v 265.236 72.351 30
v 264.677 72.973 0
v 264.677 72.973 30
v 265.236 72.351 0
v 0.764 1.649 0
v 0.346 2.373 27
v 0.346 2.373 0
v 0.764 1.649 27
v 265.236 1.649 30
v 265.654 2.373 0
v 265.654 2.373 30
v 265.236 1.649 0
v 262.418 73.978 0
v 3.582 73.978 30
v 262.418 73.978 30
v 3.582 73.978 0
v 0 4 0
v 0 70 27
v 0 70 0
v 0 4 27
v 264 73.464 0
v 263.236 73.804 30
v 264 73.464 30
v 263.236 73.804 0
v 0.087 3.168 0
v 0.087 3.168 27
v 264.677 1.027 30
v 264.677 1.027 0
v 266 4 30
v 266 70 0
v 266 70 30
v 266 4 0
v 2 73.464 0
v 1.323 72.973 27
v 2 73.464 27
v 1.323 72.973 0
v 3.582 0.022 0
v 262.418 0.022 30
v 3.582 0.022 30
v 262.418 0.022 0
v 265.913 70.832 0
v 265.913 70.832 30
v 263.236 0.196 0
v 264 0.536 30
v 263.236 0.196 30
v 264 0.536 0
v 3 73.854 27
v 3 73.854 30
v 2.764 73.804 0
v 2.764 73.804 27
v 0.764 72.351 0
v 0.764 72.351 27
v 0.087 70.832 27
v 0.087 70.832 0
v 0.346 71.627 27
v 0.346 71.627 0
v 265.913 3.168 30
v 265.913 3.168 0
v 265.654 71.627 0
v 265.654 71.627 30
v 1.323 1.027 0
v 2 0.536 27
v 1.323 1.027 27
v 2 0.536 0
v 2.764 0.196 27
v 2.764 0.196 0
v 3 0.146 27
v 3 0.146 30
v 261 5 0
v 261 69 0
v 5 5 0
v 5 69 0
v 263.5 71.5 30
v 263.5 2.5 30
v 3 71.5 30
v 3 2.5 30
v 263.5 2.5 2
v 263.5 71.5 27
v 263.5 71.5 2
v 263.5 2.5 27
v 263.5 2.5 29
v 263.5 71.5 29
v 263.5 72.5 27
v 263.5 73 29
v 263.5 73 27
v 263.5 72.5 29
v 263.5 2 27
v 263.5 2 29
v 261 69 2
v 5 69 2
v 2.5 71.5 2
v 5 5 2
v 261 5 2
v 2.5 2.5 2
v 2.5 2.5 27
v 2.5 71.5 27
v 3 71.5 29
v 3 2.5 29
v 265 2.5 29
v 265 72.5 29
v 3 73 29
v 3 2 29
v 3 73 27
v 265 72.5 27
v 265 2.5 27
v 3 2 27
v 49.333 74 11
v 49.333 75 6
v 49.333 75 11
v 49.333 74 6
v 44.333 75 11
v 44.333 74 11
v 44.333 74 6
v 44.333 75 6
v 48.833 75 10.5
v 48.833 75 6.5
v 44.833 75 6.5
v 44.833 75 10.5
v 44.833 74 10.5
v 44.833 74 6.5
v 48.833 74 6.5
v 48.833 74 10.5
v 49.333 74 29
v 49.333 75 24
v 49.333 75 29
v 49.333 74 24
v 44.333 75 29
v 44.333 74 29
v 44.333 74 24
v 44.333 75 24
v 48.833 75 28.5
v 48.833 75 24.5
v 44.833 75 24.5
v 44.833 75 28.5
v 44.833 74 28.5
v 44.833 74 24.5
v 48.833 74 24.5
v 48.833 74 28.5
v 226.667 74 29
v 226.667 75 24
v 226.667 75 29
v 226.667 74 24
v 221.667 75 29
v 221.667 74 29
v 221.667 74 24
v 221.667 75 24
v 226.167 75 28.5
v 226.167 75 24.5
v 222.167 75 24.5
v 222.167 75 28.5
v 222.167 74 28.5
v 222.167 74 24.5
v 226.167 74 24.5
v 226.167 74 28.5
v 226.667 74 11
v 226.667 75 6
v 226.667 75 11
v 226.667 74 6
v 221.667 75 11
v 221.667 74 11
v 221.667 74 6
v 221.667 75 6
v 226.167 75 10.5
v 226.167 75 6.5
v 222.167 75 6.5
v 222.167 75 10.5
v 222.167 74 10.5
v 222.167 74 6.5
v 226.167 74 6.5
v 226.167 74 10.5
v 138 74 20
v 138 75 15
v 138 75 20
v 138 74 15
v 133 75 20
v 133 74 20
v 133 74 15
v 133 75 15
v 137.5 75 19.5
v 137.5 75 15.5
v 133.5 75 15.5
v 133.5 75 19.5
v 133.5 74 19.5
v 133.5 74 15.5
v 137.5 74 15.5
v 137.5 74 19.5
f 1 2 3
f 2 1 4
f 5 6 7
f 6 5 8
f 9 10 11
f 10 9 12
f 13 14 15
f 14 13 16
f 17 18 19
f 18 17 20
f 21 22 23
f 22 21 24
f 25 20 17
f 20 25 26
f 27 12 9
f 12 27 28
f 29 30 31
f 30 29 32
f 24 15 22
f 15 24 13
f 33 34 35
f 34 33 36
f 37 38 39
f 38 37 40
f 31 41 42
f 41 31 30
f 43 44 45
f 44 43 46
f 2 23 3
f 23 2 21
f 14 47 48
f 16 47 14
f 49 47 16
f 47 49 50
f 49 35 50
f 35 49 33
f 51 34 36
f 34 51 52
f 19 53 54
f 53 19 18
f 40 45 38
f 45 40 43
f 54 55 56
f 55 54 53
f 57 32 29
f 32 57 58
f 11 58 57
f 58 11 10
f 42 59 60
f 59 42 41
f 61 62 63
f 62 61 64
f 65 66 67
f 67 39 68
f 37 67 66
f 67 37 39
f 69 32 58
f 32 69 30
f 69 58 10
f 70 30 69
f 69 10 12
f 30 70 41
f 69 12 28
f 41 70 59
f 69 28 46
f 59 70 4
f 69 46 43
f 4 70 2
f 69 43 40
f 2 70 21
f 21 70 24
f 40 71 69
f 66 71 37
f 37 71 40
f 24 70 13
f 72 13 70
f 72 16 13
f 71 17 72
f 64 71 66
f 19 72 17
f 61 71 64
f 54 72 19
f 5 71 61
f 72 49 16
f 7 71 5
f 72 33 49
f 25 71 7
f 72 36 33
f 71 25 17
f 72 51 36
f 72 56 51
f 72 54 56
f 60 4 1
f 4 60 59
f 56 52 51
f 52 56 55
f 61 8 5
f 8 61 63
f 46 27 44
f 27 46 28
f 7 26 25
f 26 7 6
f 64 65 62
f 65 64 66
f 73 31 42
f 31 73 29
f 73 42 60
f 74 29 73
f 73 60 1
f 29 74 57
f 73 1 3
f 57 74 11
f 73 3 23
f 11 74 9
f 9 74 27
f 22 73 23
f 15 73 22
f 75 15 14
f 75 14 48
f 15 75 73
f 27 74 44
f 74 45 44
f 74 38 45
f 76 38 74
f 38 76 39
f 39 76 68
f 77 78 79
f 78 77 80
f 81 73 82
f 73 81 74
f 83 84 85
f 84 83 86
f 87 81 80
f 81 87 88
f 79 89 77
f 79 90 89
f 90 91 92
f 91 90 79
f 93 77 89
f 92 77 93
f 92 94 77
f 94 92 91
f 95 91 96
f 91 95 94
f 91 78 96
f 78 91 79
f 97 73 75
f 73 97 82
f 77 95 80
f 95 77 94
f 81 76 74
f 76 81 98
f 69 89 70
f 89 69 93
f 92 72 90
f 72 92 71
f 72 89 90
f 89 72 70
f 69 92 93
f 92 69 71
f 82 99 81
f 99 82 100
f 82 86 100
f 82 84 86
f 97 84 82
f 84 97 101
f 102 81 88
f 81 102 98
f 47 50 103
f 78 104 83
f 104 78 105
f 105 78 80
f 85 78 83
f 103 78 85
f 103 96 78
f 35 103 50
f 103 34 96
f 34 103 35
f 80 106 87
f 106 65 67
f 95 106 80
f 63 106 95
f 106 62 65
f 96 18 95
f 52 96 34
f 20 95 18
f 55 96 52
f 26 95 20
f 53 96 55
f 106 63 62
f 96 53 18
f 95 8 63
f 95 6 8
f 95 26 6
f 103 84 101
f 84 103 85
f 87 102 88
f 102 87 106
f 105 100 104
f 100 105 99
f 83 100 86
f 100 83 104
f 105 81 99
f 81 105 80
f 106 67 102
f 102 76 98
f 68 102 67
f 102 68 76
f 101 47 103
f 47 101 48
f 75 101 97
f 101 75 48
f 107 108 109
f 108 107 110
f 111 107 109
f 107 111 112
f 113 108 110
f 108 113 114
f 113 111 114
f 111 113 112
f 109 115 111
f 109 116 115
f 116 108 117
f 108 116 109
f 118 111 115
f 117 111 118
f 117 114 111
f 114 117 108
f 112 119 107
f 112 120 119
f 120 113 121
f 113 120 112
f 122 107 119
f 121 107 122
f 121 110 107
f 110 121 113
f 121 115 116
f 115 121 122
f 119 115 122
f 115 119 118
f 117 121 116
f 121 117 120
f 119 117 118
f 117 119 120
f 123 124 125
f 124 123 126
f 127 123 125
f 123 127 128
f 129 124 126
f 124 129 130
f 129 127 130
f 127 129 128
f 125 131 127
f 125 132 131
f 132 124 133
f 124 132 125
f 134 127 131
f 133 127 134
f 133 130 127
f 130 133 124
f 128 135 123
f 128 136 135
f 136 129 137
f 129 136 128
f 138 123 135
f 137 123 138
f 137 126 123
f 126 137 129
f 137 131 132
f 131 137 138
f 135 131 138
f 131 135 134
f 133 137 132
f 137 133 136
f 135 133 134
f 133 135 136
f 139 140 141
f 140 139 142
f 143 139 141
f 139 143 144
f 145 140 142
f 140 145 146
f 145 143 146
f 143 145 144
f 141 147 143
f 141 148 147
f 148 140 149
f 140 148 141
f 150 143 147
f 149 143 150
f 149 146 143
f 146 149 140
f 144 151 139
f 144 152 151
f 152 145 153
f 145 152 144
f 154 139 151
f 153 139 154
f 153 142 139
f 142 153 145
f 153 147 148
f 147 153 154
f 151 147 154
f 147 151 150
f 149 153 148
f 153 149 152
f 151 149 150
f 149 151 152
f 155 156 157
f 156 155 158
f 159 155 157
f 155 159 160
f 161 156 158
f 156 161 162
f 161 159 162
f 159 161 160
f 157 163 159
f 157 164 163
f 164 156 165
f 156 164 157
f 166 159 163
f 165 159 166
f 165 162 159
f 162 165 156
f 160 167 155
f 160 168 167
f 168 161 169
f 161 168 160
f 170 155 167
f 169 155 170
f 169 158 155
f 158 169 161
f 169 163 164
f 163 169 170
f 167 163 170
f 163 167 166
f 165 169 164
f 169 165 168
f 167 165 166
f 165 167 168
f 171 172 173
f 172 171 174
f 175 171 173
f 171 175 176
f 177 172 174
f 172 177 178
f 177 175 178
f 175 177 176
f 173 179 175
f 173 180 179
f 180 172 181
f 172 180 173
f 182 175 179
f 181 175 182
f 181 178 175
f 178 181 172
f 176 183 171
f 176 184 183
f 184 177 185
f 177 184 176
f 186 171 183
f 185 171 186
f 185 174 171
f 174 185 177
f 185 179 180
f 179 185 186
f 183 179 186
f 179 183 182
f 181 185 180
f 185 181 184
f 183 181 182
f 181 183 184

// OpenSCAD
$m_length = 256;
$m_width = 64;
$m_height = 15;

$margin_x = 5;
$margin_y = 5;

$margin = ([$margin_x,$margin_y,0]);

$wall_strength = 5;
$wall = ([$wall_strength,$wall_strength,0]);

$box_l = $m_length+$margin_x+$wall_strength;
$box_w = $m_width+$margin_y+$wall_strength;
$box_h = 30;

$matrix = ([$m_length,$m_width,$box_h]);

$stand = ([5,1,5]);


font = "Liberation Sans";
letter_size = 10;
letter_height = 1;



difference() {
    // full case
    roundedcube($matrix+$wall+$margin,false,4,"z");
    //remove matrix+margin
    
    translate([$wall_strength/2,$wall_strength/2,2]) { 
        cube($matrix+$margin);
    }
    //remove matrix
    translate([$wall_strength, $wall_strength,0]) { 
        cube($matrix);
    }
    
    // insert
    translate([0,2,$box_h-3]) {
         cube([$box_l-2.5,$box_w-3,2]);
    }
    translate([$box_l-3,2.5,$box_h-3]) {
        cube([2,$box_w-4,2]);
    }
    translate([0,0,$box_h-3]) {
        cube([$wall_strength-2,$box_w,6]);
    }
    

    
}


//STAND
translate([$box_l/6,$box_w,$box_h/5]) {
    difference() {
        cube($stand);
        translate([0.5,0,0.5]) {
            cube($stand-[1,0,1]);
        }
    }
}
translate([$box_l/6,$box_w,$box_h-$box_h/5]) {
    difference() {
        cube($stand);
        translate([0.5,0,0.5]) {
            cube($stand-[1,0,1]);
        }
    }
}
translate([$box_l-$box_l/6,$box_w,$box_h-$box_h/5]) {
    difference() {
        cube($stand);
        translate([0.5,0,0.5]) {
            cube($stand-[1,0,1]);
        }
    }
}
translate([$box_l-$box_l/6,$box_w,$box_h/5]) {
    difference() {
        cube($stand);
        translate([0.5,0,0.5]) {
            cube($stand-[1,0,1]);
        }
    }
}
translate([$box_l/2,$box_w,$box_h/2]) {
    difference() {
        cube($stand);
        translate([0.5,0,0.5]) {
            cube($stand-[1,0,1]);
        }
    }
}


// BACKPLANE

/*
$backplane_dim = $matrix+$wall+$margin;
translate([0,0,7]) { 
$backplane = $backplane_dim-[0,0,3.8];

      translate([0.4,0.4,-1.5]) {
        cylinder($fn=100, r=0.15);
    }
        translate([0.4,$box_w+1-0.4,-1.5]) {
        cylinder($fn=100, r=0.15);
    }
        translate([$box_l+1-0.4,0.4,-1.5]) {
        cylinder($fn=100, r=0.15);
    }
        translate([$box_l+1-0.4,$box_w+1-0.4,-1.5]) {
        cylinder($fn=100, r=0.15);
    }  
    difference() {
        roundedcube($backplane,false,0.4,"z");
        translate([$box_l/2+1,$box_w+0.25,-1]) {
            cylinder($fn=100, r=0.15);
    }  
        translate([$box_l/2+0.85,$box_w+0.25,-0.75]) {
            cube([0.3,1.5,0.5]);
    } 
 
        translate([0,0,-0.3]) {   
            cube($backplane+[0,0,1]);
        }
    }

}
*/

//SPACER
/*translate([0.5,0.5,7]) {
  // difference() {
        cube($matrix+$margin-[0,0,2]);
    //    translate(0.5,0.5,0) {
     //       cube($matrix-[0,0,2]);
        //}
   // }
}
*/

/*difference() 
   {
       cube([10,5,10]);
       translate([0.5,0.5,0.5]) {
           cube([10,5,10]);
       }
       translate([2.5,2.5,0]) {
       cylinder($fn = 100, r=0.2);
       }
}*/






module letter(l) {
	// Use linear_extrude() to make the letters 3D objects as they
	// are only 2D shapes when only using text()
	linear_extrude(height = letter_height) {
		text(l, size = letter_size, font = font, halign = "center", valign = "center", $fn = 16);
	}
}

// Higher definition curves
$fs = 0.01;

module roundedcube(size = [1, 1, 1], center = false, radius = 0.5, apply_to = "all") {
	// If single value, convert to [x, y, z] vector
	size = (size[0] == undef) ? [size, size, size] : size;

	translate_min = radius;
	translate_xmax = size[0] - radius;
	translate_ymax = size[1] - radius;
	translate_zmax = size[2] - radius;

	diameter = radius * 2;

	module build_point(type = "sphere", rotate = [0, 0, 0]) {
		if (type == "sphere") {
			sphere(r = radius);
		} else if (type == "cylinder") {
			rotate(a = rotate)
			cylinder(h = diameter, r = radius, center = true);
		}
	}

	obj_translate = (center == false) ?
		[0, 0, 0] : [
			-(size[0] / 2),
			-(size[1] / 2),
			-(size[2] / 2)
		];

	translate(v = obj_translate) {
		hull() {
			for (translate_x = [translate_min, translate_xmax]) {
				x_at = (translate_x == translate_min) ? "min" : "max";
				for (translate_y = [translate_min, translate_ymax]) {
					y_at = (translate_y == translate_min) ? "min" : "max";
					for (translate_z = [translate_min, translate_zmax]) {
						z_at = (translate_z == translate_min) ? "min" : "max";

						translate(v = [translate_x, translate_y, translate_z])
						if (
							(apply_to == "all") ||
							(apply_to == "xmin" && x_at == "min") || (apply_to == "xmax" && x_at == "max") ||
							(apply_to == "ymin" && y_at == "min") || (apply_to == "ymax" && y_at == "max") ||
							(apply_to == "zmin" && z_at == "min") || (apply_to == "zmax" && z_at == "max")
						) {
							build_point("sphere");
						} else {
							rotate = 
								(apply_to == "xmin" || apply_to == "xmax" || apply_to == "x") ? [0, 90, 0] : (
								(apply_to == "ymin" || apply_to == "ymax" || apply_to == "y") ? [90, 90, 0] :
								[0, 0, 0]
							);
							build_point("cylinder", rotate);
						}
					}
				}
			}
		}
	}
}
